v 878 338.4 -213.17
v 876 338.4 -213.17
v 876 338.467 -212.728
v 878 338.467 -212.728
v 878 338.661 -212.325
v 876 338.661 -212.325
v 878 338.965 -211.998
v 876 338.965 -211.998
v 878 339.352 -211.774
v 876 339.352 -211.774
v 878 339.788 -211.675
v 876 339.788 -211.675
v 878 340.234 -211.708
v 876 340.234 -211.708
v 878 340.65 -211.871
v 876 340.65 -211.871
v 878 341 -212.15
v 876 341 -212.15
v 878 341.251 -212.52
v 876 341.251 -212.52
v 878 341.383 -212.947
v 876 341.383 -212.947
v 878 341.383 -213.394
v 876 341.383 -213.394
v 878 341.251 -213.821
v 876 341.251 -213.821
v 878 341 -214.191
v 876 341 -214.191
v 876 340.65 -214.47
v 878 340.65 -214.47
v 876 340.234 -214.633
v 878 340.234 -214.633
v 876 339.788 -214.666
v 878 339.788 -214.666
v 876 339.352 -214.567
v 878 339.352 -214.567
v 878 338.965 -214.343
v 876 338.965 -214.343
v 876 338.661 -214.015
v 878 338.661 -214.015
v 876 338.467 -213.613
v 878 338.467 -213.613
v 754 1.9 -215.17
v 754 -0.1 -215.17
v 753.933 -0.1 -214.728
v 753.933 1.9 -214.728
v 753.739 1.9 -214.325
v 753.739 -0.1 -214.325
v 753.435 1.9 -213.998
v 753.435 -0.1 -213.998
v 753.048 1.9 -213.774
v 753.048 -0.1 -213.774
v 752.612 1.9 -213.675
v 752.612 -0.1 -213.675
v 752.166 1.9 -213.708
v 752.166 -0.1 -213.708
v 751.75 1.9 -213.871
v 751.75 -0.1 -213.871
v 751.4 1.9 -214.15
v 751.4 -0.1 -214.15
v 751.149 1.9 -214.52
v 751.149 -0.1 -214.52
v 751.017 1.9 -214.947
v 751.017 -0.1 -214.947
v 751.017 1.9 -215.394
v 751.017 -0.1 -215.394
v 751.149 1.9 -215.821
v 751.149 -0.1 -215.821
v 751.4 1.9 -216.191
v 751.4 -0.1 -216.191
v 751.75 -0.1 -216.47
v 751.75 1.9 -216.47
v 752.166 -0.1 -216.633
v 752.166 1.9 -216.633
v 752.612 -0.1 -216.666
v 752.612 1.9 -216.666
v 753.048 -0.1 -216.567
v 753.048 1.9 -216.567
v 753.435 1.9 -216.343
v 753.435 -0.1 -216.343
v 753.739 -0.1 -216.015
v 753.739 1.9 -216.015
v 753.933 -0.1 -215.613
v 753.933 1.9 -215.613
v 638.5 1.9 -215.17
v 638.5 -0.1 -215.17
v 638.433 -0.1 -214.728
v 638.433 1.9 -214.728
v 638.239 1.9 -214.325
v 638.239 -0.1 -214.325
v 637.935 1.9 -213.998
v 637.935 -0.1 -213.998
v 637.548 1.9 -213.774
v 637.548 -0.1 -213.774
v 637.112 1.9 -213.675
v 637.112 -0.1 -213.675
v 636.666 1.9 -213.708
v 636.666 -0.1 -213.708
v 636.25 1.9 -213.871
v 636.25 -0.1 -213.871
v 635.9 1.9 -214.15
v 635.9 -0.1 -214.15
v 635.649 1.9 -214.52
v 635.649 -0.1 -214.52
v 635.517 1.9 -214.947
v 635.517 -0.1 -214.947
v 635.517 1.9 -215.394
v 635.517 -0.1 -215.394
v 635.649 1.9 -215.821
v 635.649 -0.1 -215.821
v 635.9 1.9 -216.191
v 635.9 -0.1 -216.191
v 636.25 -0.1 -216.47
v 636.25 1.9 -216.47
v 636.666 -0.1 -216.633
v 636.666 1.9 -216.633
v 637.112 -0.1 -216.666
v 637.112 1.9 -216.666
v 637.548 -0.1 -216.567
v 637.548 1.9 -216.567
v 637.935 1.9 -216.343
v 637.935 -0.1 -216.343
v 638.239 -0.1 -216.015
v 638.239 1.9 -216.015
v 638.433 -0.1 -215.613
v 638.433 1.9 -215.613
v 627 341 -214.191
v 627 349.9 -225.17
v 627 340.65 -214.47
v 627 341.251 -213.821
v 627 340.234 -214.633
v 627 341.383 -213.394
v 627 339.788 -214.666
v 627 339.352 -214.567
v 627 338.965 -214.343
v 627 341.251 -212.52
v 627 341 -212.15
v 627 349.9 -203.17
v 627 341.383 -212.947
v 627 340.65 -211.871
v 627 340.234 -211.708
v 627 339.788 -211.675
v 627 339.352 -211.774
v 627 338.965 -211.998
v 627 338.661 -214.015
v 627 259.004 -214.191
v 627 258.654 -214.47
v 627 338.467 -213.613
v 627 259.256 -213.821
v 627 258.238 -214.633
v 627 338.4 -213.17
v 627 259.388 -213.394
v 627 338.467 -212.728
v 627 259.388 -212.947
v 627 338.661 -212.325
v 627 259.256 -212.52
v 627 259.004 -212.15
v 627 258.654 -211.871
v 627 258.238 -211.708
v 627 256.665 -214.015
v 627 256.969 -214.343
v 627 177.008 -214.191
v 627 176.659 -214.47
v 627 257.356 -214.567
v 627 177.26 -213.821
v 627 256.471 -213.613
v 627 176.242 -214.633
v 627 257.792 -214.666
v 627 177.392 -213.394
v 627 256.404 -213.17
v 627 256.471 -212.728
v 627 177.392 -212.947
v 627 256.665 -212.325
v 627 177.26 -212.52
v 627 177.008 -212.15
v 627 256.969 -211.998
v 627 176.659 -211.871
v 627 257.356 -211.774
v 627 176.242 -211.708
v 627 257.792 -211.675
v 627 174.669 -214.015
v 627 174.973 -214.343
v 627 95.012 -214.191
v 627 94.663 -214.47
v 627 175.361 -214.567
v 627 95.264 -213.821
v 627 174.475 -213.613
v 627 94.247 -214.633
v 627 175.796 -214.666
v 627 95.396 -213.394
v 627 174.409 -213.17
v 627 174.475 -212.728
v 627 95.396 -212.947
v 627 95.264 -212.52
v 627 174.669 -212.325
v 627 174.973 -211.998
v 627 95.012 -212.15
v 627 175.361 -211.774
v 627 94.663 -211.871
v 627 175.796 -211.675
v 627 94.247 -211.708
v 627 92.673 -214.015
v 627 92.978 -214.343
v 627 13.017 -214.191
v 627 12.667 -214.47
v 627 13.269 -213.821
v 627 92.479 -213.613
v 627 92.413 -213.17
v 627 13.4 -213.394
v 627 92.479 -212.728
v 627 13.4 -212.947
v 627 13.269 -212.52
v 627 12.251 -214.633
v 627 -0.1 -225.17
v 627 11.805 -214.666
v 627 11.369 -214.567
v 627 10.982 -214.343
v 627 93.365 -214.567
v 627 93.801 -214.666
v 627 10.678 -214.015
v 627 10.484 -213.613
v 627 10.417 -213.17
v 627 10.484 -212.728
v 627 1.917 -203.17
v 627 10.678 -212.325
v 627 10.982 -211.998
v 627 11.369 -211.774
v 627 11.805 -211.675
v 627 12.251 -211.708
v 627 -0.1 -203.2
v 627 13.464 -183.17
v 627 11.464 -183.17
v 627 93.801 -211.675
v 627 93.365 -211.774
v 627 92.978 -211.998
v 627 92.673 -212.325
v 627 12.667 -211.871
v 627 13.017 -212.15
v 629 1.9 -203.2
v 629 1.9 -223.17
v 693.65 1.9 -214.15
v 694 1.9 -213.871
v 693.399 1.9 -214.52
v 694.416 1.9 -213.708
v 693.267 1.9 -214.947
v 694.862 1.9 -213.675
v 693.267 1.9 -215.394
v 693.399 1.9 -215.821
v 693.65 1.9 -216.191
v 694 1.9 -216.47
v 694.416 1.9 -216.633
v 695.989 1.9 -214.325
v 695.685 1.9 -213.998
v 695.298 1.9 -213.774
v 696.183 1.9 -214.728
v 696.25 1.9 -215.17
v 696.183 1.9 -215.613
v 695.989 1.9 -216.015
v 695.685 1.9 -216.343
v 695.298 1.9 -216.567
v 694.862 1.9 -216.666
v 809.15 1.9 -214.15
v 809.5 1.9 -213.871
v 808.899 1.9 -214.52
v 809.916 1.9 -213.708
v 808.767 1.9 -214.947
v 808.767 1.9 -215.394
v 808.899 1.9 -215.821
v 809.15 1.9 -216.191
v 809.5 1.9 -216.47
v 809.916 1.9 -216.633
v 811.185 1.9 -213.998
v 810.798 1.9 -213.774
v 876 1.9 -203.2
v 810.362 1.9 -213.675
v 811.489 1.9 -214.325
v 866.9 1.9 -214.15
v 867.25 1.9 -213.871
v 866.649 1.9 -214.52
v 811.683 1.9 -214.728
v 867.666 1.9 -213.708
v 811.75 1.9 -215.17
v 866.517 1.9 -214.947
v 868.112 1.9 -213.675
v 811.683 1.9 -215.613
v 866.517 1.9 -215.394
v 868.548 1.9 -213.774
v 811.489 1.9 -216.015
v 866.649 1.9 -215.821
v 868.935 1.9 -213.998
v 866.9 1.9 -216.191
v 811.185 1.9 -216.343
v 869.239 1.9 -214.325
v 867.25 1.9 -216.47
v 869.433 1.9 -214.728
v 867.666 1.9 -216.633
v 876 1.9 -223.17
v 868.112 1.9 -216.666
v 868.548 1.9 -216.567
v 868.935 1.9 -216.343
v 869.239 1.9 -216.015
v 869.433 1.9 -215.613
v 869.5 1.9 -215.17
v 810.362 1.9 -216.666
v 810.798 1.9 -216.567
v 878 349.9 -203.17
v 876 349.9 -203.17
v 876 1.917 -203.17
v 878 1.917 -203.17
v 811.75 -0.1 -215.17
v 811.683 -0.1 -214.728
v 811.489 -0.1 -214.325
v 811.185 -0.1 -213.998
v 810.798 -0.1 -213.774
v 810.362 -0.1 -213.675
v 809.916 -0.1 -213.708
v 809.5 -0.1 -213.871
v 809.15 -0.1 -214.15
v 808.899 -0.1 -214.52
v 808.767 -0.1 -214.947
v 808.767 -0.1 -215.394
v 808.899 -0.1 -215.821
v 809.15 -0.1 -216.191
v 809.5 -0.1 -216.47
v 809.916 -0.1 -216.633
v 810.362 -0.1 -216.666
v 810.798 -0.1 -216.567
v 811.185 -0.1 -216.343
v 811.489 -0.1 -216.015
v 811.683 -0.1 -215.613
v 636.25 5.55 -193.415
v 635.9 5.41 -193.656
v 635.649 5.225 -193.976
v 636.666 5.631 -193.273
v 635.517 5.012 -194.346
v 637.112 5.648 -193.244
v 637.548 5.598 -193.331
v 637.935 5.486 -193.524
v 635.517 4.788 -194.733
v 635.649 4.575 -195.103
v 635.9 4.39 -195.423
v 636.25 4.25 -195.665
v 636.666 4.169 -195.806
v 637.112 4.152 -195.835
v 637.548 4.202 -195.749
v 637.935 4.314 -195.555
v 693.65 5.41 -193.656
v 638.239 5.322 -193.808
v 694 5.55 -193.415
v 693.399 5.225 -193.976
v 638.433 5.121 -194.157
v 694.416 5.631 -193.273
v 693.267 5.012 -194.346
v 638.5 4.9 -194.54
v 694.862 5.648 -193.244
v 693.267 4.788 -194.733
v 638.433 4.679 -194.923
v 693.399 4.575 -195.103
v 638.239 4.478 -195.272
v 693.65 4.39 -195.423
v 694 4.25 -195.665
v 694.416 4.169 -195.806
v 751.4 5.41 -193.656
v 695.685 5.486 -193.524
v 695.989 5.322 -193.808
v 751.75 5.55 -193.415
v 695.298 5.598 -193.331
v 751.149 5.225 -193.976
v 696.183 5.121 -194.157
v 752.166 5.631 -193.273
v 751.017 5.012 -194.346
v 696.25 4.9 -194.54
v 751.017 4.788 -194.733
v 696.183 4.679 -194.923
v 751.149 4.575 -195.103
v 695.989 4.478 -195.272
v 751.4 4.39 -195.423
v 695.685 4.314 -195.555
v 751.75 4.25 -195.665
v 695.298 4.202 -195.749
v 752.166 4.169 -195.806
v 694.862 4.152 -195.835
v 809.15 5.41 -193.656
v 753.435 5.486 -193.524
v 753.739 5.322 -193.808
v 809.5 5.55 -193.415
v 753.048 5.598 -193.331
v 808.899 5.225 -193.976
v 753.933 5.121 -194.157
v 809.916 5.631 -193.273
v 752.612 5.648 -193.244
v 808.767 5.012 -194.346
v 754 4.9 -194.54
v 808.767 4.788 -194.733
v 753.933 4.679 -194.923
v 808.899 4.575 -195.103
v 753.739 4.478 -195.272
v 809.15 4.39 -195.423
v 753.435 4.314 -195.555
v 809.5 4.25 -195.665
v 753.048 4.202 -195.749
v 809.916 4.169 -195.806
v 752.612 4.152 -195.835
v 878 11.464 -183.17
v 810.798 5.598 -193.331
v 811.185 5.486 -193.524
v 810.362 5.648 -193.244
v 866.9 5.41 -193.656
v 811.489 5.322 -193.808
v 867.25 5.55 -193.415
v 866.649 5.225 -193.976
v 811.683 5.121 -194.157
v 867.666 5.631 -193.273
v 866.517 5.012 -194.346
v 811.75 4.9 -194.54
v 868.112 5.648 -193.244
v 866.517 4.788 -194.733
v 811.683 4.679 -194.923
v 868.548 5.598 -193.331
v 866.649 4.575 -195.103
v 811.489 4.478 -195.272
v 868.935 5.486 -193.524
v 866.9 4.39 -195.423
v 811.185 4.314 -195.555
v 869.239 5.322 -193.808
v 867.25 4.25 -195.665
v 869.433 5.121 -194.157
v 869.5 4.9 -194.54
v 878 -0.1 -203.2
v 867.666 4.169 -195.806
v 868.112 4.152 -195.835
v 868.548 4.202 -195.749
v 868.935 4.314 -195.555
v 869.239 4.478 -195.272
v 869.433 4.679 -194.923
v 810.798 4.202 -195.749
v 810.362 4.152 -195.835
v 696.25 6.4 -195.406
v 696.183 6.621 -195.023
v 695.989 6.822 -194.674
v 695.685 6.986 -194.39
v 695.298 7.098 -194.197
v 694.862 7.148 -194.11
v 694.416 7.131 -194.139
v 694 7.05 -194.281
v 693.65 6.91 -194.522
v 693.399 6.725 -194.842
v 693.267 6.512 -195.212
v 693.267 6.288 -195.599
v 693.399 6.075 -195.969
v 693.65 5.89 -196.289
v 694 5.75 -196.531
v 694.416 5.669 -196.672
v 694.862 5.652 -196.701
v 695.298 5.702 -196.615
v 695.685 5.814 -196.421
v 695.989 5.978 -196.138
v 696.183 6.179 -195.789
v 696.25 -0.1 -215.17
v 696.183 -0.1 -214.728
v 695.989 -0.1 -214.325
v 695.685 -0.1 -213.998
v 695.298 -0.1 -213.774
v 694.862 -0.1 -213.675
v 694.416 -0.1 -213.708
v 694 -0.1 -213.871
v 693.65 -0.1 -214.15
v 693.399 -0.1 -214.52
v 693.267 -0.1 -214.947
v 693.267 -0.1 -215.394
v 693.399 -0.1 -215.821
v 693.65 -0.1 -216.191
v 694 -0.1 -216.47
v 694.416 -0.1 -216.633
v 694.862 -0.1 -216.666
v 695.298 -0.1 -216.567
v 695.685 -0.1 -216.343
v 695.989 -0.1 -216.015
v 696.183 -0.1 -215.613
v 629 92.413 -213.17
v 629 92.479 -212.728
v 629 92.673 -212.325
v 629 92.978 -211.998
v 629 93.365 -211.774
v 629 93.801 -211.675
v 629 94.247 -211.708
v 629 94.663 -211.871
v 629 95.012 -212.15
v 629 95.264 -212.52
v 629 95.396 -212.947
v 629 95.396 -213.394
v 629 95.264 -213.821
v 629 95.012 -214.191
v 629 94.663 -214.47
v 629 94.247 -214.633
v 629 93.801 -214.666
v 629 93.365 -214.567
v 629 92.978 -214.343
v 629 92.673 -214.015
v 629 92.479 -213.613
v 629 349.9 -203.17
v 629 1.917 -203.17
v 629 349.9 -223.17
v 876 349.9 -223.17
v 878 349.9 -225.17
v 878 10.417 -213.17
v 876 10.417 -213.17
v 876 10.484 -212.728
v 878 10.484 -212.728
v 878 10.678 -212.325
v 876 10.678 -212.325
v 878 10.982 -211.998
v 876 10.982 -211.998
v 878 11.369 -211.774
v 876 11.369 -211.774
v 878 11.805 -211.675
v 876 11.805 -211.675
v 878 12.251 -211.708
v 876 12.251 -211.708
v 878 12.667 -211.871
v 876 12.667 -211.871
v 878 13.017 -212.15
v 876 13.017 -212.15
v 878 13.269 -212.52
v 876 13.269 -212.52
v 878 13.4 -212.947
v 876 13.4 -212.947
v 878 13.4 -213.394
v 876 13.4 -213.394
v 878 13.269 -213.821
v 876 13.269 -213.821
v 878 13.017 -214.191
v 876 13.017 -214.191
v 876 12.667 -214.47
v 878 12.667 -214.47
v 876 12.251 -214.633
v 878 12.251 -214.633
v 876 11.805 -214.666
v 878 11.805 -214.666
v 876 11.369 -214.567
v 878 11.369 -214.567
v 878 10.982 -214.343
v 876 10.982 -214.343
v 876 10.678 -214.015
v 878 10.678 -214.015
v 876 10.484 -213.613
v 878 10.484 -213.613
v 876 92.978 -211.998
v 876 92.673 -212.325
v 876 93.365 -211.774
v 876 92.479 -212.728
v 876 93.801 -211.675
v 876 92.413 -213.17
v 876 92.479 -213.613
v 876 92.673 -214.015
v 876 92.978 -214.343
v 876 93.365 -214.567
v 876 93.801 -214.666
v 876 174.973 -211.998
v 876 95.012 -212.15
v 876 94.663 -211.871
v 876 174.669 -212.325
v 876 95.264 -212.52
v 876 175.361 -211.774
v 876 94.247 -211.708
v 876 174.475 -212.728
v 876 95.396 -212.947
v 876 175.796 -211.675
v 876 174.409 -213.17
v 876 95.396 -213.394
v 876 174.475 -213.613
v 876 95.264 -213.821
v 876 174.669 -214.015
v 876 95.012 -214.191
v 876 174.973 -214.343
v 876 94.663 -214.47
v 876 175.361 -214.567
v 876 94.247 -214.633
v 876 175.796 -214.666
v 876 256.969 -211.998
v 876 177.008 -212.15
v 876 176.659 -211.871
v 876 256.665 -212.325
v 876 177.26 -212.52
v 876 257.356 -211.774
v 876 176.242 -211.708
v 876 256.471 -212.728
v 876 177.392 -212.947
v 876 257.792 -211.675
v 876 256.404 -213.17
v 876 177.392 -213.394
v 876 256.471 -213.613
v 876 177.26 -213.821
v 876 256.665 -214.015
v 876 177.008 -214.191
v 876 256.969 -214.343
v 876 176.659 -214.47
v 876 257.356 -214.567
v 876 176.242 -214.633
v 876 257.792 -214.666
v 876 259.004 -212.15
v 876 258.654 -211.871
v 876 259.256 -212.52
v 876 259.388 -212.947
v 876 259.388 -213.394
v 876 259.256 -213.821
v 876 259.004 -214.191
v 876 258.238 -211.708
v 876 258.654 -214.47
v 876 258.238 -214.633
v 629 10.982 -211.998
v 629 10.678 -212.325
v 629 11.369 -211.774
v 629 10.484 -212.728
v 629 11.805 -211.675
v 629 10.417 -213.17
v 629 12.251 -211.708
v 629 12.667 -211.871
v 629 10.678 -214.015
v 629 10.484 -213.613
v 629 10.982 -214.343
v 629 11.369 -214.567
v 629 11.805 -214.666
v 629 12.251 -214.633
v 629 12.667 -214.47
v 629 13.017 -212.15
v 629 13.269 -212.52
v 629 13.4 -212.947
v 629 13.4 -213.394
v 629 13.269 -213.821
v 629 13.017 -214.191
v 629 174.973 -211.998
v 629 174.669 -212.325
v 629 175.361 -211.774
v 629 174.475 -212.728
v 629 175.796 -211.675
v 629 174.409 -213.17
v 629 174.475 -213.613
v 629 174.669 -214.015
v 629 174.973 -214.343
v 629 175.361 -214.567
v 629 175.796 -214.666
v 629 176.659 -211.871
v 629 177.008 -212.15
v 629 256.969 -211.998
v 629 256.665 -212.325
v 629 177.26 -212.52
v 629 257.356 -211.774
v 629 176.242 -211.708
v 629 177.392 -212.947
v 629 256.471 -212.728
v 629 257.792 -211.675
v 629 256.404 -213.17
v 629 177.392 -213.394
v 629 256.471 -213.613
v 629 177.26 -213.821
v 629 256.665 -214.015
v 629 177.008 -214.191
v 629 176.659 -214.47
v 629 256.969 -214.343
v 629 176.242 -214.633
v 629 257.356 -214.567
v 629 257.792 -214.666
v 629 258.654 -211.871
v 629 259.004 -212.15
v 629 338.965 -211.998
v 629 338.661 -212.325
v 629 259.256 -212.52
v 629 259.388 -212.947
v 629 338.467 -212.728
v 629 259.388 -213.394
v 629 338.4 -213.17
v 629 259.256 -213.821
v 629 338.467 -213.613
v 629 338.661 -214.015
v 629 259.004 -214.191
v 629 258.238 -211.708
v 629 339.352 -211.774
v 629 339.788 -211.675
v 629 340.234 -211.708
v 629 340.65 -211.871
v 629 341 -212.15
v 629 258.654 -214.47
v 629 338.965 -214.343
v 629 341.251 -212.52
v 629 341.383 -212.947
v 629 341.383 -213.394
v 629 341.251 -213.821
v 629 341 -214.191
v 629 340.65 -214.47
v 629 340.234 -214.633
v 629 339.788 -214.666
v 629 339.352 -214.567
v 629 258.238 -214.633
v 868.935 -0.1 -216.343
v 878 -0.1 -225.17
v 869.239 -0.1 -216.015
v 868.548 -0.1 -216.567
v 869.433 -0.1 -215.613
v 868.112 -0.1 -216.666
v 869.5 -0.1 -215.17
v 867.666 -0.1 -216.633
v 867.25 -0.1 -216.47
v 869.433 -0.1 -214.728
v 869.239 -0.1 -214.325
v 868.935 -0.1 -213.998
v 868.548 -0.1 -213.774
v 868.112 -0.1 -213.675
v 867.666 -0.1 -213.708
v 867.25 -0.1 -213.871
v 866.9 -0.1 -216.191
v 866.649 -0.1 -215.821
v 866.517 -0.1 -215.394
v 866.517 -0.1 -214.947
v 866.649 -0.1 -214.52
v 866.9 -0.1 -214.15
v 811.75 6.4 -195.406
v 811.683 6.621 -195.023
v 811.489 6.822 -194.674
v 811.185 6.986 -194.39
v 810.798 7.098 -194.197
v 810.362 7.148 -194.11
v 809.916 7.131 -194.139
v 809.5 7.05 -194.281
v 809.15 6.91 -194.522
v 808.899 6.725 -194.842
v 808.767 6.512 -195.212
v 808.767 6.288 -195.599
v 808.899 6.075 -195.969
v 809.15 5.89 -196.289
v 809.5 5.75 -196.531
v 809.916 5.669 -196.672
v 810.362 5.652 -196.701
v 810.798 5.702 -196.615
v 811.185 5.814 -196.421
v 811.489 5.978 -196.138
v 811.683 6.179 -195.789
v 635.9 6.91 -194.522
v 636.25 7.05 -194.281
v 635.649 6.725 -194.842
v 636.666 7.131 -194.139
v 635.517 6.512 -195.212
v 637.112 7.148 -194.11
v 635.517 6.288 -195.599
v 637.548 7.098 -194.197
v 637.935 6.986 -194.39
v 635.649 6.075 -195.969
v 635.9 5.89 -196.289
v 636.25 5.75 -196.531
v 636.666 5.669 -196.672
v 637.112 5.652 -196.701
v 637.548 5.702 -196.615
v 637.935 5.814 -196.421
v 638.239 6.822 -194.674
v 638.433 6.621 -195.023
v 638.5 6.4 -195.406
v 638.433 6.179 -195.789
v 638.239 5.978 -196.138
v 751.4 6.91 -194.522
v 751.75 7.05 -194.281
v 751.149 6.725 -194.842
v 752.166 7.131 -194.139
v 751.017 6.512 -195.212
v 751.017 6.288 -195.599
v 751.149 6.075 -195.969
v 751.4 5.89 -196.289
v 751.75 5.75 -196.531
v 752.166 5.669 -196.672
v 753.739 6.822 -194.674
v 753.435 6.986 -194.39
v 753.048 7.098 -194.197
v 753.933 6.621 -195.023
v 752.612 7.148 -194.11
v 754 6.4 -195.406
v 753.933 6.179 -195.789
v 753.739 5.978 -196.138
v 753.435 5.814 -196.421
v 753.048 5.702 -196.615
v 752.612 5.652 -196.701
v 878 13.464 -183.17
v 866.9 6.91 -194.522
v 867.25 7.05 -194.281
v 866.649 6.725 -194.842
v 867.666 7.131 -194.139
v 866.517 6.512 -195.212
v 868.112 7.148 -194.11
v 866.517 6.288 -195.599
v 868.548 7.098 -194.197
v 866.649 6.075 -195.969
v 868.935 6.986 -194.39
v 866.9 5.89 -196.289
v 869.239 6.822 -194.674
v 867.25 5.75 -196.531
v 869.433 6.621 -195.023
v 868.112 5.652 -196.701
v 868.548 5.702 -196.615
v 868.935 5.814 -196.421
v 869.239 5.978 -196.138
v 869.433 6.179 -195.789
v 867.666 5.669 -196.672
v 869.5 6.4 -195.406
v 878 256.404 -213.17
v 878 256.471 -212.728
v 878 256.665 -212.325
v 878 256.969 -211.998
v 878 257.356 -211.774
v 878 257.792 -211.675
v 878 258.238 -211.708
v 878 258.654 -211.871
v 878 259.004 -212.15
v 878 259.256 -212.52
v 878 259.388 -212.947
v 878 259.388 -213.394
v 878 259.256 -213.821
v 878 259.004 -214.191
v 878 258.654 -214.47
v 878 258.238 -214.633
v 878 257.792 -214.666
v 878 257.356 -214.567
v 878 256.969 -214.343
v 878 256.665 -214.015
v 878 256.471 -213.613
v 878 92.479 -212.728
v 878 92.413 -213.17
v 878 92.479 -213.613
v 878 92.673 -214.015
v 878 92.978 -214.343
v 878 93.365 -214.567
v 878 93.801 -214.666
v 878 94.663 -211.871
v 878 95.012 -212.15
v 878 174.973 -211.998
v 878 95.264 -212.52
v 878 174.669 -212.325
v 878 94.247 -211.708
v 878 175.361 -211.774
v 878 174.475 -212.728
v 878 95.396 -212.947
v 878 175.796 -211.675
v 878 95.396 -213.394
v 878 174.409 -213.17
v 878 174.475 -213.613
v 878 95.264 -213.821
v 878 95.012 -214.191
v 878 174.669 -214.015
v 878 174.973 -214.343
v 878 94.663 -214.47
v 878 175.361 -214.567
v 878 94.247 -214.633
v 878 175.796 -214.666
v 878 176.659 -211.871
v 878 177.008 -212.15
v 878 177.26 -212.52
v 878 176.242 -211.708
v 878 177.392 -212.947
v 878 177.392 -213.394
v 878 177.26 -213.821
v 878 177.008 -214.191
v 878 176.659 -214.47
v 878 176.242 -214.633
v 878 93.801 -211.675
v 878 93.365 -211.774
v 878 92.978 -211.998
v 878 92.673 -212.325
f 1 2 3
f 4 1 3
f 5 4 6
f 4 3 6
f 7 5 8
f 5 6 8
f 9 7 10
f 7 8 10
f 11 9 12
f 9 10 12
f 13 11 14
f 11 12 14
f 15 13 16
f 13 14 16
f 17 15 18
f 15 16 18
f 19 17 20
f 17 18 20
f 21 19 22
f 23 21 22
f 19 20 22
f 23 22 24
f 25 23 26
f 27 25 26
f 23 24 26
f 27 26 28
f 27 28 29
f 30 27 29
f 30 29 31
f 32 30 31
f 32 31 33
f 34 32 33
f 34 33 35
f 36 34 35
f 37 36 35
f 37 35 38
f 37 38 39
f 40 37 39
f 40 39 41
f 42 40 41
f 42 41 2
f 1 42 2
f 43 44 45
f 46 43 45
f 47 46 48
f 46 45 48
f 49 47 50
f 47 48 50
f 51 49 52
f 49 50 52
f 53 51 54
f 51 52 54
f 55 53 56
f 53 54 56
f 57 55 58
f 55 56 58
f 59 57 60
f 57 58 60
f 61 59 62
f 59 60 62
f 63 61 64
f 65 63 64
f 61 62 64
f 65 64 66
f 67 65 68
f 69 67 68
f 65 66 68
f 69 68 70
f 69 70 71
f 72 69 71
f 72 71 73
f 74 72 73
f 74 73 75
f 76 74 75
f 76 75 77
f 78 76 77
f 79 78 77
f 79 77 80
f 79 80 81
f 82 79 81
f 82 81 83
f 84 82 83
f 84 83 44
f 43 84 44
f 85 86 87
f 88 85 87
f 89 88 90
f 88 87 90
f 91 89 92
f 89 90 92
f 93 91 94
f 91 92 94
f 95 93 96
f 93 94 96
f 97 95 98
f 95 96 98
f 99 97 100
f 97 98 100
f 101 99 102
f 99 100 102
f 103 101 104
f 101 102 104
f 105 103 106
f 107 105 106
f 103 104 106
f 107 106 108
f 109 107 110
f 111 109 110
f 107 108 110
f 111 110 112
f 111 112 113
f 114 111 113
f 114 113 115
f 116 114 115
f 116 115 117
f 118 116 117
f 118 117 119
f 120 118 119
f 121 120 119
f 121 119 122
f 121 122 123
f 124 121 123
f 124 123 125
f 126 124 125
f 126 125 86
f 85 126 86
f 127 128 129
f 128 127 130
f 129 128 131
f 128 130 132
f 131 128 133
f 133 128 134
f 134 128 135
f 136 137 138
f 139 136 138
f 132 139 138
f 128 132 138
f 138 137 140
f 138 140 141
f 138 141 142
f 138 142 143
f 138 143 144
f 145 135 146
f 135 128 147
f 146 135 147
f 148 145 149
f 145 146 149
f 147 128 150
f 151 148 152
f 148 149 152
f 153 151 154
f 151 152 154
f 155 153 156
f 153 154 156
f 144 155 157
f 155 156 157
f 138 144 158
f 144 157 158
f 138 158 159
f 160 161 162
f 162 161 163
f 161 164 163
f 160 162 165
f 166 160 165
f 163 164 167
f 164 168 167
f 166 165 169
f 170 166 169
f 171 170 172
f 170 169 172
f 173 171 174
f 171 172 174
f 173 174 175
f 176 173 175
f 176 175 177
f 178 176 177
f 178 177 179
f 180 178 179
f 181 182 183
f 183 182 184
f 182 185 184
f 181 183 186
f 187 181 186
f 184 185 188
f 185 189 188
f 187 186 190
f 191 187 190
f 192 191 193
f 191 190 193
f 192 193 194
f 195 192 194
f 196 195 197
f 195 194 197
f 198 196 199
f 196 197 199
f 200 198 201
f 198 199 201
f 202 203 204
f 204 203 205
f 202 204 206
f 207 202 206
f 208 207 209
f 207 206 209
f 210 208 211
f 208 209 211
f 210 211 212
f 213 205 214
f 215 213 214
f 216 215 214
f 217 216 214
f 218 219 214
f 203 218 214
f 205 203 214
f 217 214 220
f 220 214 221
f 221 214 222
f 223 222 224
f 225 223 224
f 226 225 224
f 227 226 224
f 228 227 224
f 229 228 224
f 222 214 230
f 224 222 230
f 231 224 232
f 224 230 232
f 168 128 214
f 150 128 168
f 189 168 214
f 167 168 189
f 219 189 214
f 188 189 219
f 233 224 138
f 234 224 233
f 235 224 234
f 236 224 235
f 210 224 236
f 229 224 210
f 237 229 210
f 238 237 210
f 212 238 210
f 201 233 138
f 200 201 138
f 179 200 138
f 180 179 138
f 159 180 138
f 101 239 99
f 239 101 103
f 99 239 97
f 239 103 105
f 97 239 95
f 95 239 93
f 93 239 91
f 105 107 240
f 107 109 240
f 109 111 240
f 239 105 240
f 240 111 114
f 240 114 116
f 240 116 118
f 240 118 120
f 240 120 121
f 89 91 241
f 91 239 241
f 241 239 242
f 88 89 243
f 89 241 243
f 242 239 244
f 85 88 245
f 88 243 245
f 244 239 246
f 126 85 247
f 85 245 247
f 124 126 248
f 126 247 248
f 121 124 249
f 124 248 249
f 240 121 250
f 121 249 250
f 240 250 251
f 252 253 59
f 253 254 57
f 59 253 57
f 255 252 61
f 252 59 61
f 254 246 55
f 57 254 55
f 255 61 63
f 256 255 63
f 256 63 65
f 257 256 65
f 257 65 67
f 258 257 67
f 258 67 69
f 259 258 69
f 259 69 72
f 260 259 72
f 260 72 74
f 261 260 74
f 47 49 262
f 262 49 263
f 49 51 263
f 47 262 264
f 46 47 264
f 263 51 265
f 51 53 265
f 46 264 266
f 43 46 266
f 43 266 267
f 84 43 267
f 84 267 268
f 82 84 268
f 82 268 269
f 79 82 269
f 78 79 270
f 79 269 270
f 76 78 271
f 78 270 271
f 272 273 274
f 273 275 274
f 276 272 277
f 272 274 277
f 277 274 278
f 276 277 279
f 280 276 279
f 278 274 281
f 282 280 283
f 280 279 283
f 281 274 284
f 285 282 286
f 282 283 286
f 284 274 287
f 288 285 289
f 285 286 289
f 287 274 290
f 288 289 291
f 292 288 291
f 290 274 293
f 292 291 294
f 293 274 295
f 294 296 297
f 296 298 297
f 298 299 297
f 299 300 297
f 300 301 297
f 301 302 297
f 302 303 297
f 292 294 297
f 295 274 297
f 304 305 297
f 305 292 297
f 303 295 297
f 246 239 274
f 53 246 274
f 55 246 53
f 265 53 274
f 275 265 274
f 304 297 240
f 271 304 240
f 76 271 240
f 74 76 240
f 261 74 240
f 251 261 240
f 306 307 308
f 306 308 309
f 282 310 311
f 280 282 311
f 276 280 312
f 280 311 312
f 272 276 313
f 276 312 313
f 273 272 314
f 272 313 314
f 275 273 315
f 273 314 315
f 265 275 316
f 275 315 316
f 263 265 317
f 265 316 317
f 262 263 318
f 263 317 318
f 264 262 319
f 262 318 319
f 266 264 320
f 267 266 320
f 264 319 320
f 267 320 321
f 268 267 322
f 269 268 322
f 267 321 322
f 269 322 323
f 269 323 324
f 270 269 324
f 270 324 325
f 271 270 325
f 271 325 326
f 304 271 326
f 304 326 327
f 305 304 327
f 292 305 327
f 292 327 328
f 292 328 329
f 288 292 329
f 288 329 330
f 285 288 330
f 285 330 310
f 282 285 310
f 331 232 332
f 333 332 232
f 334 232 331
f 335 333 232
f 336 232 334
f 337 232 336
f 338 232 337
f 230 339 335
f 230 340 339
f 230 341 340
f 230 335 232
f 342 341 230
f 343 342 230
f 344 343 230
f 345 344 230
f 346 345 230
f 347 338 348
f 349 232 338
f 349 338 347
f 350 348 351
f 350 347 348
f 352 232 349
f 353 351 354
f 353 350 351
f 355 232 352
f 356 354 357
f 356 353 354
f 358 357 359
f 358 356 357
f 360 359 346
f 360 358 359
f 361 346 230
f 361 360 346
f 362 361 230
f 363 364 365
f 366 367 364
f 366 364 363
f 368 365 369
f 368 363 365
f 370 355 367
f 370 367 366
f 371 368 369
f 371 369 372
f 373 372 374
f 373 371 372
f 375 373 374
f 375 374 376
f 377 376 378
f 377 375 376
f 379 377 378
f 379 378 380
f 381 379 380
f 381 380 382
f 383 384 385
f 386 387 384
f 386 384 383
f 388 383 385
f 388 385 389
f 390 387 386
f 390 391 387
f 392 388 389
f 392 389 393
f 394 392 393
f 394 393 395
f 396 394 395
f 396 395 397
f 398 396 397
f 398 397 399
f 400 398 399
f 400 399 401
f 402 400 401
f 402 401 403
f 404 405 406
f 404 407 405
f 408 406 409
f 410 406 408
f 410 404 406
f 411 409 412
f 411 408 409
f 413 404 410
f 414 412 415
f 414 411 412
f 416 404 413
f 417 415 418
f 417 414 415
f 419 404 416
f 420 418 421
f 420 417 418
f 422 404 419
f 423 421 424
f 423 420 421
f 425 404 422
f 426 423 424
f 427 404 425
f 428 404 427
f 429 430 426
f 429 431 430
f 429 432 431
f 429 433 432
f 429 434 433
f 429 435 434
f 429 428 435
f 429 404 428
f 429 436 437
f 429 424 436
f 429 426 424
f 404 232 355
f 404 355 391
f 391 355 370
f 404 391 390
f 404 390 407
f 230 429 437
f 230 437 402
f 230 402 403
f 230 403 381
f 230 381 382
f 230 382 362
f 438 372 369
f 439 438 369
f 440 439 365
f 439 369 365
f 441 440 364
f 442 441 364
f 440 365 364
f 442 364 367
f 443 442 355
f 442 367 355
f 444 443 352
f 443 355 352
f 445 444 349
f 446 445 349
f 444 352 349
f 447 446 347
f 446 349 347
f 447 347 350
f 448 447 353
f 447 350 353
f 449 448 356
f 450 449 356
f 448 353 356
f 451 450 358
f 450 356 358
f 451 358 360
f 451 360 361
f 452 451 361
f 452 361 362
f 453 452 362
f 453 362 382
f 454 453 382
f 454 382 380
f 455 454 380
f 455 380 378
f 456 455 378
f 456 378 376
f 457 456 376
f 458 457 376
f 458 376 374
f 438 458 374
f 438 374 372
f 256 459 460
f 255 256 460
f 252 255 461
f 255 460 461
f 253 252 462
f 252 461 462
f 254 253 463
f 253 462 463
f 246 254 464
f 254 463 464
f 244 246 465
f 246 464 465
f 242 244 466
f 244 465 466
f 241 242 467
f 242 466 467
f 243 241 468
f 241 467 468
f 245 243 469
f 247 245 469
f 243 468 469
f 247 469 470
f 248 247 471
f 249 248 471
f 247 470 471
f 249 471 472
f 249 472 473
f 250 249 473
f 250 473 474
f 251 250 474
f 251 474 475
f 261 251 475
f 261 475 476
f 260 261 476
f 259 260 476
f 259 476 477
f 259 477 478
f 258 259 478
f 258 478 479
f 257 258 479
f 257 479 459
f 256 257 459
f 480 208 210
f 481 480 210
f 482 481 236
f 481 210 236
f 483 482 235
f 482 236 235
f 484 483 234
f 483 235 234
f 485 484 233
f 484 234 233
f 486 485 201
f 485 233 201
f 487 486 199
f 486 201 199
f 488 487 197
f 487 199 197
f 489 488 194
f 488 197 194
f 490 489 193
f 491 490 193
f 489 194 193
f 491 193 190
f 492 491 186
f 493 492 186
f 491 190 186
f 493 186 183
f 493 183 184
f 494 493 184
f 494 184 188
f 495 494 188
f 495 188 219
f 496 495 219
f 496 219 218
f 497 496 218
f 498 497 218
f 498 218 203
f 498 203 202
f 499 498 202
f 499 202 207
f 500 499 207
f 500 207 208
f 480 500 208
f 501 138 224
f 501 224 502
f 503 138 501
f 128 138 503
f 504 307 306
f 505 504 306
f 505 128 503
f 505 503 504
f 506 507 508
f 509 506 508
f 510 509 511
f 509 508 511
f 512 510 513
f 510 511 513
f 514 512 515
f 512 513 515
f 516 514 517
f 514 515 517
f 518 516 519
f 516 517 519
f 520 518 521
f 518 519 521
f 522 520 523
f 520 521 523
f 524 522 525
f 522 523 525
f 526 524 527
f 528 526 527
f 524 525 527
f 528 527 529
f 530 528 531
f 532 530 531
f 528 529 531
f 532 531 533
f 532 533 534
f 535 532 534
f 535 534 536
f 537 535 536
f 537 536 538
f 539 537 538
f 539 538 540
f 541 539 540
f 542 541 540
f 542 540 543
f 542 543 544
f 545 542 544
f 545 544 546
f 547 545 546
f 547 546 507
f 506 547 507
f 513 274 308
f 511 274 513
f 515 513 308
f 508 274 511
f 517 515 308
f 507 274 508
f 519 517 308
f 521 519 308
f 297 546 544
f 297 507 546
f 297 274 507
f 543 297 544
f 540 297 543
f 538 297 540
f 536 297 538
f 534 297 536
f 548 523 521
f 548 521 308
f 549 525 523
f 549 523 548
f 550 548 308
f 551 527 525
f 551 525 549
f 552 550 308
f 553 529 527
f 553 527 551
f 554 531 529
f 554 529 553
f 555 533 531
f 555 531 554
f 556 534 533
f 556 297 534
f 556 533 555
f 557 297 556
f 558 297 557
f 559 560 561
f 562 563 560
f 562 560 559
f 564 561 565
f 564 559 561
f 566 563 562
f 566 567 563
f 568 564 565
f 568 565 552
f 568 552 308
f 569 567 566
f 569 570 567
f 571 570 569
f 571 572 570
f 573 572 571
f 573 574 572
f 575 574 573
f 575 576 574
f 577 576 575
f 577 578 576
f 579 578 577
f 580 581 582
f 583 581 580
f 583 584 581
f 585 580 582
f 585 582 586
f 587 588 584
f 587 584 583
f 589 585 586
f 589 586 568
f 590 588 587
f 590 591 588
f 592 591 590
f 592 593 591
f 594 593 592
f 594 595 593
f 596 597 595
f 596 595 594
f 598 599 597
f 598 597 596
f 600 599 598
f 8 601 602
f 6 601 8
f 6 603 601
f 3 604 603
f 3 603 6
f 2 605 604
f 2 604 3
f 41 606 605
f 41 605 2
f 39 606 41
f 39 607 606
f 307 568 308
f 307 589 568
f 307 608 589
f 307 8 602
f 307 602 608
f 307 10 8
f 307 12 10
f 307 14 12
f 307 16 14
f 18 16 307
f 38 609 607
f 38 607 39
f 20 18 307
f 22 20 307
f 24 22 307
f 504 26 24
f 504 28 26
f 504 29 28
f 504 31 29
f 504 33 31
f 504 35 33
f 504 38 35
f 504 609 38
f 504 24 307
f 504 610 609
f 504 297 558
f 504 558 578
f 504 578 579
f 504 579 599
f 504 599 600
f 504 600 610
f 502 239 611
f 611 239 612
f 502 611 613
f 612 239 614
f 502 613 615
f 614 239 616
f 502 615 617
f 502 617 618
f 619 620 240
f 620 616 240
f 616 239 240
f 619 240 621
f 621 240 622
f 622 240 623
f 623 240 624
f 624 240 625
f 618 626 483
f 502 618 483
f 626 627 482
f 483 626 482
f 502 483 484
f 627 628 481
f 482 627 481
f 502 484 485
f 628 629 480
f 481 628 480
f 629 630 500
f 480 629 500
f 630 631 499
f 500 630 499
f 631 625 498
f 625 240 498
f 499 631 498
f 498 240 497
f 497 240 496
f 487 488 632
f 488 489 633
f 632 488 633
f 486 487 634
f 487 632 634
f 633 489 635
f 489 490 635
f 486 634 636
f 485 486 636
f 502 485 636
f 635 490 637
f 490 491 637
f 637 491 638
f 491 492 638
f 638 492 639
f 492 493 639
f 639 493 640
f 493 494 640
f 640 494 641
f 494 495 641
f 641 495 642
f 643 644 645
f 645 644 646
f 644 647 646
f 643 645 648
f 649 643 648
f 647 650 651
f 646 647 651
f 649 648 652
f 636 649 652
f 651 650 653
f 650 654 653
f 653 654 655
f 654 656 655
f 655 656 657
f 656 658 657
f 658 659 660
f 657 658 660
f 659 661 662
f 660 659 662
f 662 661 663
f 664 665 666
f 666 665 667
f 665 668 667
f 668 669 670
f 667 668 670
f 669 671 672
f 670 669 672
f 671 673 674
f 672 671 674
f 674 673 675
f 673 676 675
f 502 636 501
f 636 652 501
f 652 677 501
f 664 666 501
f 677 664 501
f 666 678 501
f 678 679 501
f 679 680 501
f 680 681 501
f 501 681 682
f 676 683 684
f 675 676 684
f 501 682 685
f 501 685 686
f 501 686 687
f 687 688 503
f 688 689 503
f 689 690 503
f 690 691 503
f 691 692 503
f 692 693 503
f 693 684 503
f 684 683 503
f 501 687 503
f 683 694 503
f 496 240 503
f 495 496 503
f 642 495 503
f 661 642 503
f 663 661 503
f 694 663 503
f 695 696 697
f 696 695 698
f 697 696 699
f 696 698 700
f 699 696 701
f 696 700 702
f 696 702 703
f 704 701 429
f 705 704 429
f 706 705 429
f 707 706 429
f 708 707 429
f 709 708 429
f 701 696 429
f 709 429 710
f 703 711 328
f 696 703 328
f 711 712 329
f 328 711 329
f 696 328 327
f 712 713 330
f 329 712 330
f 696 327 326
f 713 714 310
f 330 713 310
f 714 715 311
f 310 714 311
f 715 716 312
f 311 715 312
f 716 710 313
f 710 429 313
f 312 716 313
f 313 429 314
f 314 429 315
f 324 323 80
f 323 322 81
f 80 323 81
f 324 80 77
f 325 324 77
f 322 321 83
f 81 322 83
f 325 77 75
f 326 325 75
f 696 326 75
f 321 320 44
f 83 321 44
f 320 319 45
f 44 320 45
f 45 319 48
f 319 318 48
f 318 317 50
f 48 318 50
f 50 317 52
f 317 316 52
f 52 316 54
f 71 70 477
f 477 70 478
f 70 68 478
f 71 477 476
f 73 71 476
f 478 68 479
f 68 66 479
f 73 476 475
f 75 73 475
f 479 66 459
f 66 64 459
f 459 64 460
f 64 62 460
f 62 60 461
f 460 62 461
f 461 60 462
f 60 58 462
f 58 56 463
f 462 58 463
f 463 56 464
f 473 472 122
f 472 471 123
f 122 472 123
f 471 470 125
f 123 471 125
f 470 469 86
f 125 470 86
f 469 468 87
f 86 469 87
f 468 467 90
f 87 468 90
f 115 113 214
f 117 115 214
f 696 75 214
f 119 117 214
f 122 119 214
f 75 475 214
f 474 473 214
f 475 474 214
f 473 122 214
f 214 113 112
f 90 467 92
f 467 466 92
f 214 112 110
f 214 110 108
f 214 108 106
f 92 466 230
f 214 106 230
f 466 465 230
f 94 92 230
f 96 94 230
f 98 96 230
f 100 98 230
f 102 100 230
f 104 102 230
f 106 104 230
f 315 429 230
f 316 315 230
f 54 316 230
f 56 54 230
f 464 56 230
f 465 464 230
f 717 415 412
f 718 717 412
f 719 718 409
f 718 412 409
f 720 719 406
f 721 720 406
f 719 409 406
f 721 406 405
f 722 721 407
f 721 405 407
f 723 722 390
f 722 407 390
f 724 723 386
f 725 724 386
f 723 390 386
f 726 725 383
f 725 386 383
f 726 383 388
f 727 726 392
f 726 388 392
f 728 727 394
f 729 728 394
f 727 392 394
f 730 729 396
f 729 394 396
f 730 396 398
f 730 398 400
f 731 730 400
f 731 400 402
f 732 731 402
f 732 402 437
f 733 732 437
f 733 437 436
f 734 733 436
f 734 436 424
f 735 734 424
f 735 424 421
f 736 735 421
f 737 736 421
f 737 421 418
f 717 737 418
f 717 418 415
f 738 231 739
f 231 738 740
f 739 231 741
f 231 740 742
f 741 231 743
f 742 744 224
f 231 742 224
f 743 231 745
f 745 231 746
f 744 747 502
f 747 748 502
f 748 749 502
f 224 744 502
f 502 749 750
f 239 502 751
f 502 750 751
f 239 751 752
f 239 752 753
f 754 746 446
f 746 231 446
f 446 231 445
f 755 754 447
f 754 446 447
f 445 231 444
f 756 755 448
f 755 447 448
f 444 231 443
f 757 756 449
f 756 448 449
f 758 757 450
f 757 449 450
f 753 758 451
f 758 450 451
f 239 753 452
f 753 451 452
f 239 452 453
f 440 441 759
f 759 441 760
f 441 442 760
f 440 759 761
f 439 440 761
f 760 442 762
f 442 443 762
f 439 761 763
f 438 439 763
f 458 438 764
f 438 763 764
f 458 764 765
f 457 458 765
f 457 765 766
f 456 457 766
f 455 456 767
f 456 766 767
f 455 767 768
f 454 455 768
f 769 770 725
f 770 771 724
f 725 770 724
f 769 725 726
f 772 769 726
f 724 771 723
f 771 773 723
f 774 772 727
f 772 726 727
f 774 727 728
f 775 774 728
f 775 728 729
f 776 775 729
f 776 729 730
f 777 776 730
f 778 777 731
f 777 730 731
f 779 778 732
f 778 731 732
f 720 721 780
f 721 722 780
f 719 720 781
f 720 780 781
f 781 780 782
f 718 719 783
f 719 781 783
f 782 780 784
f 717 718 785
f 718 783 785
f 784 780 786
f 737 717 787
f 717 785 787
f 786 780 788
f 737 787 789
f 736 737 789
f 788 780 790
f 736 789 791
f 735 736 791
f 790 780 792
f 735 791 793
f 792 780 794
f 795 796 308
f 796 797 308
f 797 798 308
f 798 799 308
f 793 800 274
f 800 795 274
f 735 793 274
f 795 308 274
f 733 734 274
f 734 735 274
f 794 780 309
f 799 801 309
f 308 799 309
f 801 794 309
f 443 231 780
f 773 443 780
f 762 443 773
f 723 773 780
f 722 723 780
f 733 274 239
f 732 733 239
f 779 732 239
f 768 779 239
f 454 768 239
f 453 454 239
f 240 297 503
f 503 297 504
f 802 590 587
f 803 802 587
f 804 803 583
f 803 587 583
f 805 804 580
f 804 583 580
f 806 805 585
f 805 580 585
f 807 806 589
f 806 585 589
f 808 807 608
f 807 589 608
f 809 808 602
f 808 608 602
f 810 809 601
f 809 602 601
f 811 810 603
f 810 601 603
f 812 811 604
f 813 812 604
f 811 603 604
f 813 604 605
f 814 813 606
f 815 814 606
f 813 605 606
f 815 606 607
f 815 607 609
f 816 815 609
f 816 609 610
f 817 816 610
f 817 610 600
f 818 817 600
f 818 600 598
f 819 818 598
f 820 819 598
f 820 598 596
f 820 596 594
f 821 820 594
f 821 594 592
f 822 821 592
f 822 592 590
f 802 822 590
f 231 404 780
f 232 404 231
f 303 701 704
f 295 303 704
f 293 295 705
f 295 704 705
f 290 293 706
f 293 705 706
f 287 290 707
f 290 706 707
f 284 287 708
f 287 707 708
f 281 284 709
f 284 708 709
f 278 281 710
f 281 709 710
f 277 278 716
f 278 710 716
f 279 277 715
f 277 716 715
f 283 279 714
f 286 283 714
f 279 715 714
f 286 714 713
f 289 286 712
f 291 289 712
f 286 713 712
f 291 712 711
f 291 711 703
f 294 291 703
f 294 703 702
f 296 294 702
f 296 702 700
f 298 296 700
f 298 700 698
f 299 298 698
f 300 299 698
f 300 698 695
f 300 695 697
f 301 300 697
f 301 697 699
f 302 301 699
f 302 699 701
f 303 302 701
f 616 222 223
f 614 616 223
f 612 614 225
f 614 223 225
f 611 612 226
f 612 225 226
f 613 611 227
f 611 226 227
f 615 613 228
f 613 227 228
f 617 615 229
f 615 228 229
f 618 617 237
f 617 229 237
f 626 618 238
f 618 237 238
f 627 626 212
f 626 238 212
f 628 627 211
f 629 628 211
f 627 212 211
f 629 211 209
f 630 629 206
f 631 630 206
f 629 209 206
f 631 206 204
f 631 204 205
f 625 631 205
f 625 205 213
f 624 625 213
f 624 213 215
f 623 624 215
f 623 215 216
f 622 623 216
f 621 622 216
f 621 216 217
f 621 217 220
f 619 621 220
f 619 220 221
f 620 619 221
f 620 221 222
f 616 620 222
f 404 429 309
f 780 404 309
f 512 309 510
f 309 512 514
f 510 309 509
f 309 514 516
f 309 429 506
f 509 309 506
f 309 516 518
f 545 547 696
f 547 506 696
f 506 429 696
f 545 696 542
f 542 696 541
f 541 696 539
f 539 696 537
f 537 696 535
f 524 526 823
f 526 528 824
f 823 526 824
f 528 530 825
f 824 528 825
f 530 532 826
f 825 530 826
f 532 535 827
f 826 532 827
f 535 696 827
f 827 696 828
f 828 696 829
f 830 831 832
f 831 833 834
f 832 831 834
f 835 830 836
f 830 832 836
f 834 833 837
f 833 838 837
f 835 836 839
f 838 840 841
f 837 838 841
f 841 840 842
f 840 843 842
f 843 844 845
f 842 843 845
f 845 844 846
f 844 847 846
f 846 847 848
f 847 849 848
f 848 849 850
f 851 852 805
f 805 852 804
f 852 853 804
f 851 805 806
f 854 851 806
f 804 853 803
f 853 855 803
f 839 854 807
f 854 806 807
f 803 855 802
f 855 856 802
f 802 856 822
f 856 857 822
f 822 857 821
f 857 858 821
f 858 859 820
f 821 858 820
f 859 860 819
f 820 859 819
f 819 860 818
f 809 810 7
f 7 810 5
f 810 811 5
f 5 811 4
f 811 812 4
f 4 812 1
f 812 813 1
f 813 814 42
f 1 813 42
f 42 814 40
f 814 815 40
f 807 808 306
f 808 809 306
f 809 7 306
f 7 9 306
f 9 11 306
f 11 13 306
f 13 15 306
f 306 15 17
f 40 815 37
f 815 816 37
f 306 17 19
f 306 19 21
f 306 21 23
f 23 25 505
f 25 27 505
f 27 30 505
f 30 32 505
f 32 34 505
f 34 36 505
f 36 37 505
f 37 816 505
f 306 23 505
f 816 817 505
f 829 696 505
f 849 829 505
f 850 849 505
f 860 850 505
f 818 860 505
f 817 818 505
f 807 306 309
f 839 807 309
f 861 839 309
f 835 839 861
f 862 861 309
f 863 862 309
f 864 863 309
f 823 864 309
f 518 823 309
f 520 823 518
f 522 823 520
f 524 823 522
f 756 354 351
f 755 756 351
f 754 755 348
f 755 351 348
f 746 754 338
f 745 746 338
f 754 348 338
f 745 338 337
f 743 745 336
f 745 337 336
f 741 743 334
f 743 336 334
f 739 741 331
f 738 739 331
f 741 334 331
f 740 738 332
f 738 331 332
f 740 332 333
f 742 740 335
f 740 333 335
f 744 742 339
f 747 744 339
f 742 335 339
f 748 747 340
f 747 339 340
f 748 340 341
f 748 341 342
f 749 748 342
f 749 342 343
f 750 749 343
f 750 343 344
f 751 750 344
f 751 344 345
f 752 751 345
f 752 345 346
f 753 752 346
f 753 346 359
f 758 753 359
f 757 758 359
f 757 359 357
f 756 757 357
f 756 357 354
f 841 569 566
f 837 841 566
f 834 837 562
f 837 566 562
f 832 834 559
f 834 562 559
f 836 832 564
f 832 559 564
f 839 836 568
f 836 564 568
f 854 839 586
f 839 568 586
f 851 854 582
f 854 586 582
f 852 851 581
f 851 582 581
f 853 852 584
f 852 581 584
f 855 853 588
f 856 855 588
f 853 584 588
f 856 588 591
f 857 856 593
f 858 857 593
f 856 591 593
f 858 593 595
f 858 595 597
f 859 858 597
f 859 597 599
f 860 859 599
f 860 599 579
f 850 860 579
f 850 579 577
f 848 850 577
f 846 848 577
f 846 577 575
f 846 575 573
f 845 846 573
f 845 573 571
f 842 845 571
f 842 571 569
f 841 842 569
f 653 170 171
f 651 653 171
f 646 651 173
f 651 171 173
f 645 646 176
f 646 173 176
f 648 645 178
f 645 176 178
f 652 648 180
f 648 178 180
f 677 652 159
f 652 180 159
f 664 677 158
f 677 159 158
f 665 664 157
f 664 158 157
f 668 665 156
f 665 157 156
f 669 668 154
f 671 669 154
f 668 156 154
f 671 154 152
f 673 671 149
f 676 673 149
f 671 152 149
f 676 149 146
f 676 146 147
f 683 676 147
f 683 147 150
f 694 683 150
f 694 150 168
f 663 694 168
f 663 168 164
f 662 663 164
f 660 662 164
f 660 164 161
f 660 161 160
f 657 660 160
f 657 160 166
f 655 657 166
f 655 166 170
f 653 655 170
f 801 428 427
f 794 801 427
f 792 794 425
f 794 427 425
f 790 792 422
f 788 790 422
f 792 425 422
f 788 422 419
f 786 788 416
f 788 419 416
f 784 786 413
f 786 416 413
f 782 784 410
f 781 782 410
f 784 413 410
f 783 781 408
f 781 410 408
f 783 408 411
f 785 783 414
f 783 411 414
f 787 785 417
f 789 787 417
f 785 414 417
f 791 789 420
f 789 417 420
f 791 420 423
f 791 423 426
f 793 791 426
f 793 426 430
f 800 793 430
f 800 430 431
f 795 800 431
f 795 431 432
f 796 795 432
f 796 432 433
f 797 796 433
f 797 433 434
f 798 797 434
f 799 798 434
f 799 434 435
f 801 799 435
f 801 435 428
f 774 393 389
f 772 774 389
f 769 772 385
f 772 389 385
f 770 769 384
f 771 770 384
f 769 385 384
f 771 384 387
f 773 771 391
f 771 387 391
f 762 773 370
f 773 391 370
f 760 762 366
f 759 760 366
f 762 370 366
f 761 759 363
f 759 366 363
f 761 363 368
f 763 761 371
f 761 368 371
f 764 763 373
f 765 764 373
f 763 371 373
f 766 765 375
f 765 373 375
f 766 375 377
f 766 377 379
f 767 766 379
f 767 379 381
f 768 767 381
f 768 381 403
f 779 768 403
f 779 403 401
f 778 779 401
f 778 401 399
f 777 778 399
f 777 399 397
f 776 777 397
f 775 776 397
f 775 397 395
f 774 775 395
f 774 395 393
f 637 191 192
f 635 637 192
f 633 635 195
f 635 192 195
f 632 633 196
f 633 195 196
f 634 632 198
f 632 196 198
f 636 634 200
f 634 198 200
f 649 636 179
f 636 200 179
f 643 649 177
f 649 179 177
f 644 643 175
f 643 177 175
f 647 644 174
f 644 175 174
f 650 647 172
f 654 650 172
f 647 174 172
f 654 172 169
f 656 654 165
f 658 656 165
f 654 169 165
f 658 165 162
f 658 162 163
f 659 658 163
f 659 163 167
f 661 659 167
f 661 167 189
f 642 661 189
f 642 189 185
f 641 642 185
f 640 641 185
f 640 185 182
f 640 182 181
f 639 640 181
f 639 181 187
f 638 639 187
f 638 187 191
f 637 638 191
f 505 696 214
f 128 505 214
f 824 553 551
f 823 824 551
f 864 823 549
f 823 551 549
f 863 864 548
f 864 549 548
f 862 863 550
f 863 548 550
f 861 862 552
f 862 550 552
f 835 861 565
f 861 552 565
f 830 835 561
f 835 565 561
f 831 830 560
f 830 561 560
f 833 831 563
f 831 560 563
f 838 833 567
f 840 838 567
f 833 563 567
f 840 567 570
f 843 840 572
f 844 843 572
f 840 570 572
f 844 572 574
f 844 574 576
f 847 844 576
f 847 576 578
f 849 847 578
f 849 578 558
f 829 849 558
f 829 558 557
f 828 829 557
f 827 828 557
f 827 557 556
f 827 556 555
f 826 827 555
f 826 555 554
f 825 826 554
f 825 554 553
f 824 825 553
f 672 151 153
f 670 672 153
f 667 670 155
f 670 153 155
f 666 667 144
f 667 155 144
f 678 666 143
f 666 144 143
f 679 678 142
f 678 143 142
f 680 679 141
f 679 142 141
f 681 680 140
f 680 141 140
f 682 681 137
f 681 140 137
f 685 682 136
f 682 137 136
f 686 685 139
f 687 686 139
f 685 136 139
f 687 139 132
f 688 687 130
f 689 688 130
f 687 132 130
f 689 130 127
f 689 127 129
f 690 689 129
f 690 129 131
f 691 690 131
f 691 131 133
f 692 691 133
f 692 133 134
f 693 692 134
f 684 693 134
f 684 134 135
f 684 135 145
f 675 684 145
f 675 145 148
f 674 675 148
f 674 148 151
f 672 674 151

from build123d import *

# Parameters (mm, degrees)
SKETCH063_W     = 251
SKETCH063_H     = 42
PAD011_DEPTH    = 350
POCKET027_DEPTH = 251.001
POCKET028_DEPTH = 251.001
SKETCH039_W     = 2
SKETCH039_H     = 348
PAD034_DEPTH    = 20
SKETCH091_R     = 1.5
POCKET049_DEPTH = 5
SKETCH092_R     = 1.5
POCKET050_DEPTH = 5
SKETCH093_R     = 1.5
POCKET051_DEPTH = 251.001


with BuildPart() as part:
    # Sketch063 (on Face1 of Binder032) → Pad011 (new body)
    with BuildSketch(Plane(origin=(0, -0.1, 0), x_dir=(-1, 0, 0), z_dir=(0, 1, 0))):
        with Locations((-752.5, -204.170471)):
            Rectangle(SKETCH063_W, SKETCH063_H)
    extrude(amount=PAD011_DEPTH)

    # Sketch064 (on Face1 of Pad011) → Pocket027 (cut, through all)
    with BuildSketch(Plane.YZ.offset(878)):
        Polygon((-0.1, -183.170471), (11.464042, -183.170471), (-0.1, -203.2), align=None)
    extrude(amount=-POCKET027_DEPTH, mode=Mode.SUBTRACT)

    # Sketch038 (on Face1 of Pocket027) → Pocket028 (cut, through all)
    with BuildSketch(Plane.YZ.offset(878)):
        Polygon((13.464042, -183.170471), (1.9, -203.2), (1.9, -223.170471), (349.9, -223.170471), (349.9, -183.170471), align=None)
    extrude(amount=-POCKET028_DEPTH, mode=Mode.SUBTRACT)

    # Sketch039 (on Face5 of Pocket028) → Pad034 (join)
    with BuildSketch(Plane.XY.offset(-223.170471)):
        with Locations((877, 175.9)):
            Rectangle(SKETCH039_W, SKETCH039_H)
        with Locations((628, 175.9)):
            Rectangle(SKETCH039_W, SKETCH039_H)
    extrude(amount=PAD034_DEPTH)

    # Sketch091 (on Face5 of Pad034) → Pocket049 (cut)
    with BuildSketch(Plane(origin=(0, 87.913136, -50.75662), x_dir=(1, 0, 0), z_dir=(0, -0.866026, 0.5))):
        with Locations((868, -166.026408)):
            Circle(SKETCH091_R)
        with Locations((810.25, -166.026408)):
            Circle(SKETCH091_R)
        with Locations((752.5, -166.026408)):
            Circle(SKETCH091_R)
        with Locations((694.75, -166.026408)):
            Circle(SKETCH091_R)
        with Locations((637, -166.026408)):
            Circle(SKETCH091_R)
    extrude(amount=-POCKET049_DEPTH, mode=Mode.SUBTRACT)

    # Sketch092 (on Face18 of Pocket049) → Pocket050 (cut)
    with BuildSketch(Plane.XZ.offset(0.1)):
        with Locations((868, -215.170471)):
            Circle(SKETCH092_R)
        with Locations((810.25, -215.170471)):
            Circle(SKETCH092_R)
        with Locations((752.5, -215.170471)):
            Circle(SKETCH092_R)
        with Locations((694.75, -215.170471)):
            Circle(SKETCH092_R)
        with Locations((637, -215.170471)):
            Circle(SKETCH092_R)
    extrude(amount=-POCKET050_DEPTH, mode=Mode.SUBTRACT)

    # Sketch093 (on Face10 of Pocket050) → Pocket051 (cut, through all)
    with BuildSketch(Plane(origin=(627, 0, 0), x_dir=(0, -1, 0), z_dir=(-1, 0, 0))):
        with Locations((-11.917049, -213.170471)):
            Circle(SKETCH093_R)
        with Locations((-93.912786, -213.170471)):
            Circle(SKETCH093_R)
        with Locations((-175.908524, -213.170471)):
            Circle(SKETCH093_R)
        with Locations((-257.904262, -213.170471)):
            Circle(SKETCH093_R)
        with Locations((-339.9, -213.170471)):
            Circle(SKETCH093_R)
    extrude(amount=-POCKET051_DEPTH, mode=Mode.SUBTRACT)


solid = part.part
